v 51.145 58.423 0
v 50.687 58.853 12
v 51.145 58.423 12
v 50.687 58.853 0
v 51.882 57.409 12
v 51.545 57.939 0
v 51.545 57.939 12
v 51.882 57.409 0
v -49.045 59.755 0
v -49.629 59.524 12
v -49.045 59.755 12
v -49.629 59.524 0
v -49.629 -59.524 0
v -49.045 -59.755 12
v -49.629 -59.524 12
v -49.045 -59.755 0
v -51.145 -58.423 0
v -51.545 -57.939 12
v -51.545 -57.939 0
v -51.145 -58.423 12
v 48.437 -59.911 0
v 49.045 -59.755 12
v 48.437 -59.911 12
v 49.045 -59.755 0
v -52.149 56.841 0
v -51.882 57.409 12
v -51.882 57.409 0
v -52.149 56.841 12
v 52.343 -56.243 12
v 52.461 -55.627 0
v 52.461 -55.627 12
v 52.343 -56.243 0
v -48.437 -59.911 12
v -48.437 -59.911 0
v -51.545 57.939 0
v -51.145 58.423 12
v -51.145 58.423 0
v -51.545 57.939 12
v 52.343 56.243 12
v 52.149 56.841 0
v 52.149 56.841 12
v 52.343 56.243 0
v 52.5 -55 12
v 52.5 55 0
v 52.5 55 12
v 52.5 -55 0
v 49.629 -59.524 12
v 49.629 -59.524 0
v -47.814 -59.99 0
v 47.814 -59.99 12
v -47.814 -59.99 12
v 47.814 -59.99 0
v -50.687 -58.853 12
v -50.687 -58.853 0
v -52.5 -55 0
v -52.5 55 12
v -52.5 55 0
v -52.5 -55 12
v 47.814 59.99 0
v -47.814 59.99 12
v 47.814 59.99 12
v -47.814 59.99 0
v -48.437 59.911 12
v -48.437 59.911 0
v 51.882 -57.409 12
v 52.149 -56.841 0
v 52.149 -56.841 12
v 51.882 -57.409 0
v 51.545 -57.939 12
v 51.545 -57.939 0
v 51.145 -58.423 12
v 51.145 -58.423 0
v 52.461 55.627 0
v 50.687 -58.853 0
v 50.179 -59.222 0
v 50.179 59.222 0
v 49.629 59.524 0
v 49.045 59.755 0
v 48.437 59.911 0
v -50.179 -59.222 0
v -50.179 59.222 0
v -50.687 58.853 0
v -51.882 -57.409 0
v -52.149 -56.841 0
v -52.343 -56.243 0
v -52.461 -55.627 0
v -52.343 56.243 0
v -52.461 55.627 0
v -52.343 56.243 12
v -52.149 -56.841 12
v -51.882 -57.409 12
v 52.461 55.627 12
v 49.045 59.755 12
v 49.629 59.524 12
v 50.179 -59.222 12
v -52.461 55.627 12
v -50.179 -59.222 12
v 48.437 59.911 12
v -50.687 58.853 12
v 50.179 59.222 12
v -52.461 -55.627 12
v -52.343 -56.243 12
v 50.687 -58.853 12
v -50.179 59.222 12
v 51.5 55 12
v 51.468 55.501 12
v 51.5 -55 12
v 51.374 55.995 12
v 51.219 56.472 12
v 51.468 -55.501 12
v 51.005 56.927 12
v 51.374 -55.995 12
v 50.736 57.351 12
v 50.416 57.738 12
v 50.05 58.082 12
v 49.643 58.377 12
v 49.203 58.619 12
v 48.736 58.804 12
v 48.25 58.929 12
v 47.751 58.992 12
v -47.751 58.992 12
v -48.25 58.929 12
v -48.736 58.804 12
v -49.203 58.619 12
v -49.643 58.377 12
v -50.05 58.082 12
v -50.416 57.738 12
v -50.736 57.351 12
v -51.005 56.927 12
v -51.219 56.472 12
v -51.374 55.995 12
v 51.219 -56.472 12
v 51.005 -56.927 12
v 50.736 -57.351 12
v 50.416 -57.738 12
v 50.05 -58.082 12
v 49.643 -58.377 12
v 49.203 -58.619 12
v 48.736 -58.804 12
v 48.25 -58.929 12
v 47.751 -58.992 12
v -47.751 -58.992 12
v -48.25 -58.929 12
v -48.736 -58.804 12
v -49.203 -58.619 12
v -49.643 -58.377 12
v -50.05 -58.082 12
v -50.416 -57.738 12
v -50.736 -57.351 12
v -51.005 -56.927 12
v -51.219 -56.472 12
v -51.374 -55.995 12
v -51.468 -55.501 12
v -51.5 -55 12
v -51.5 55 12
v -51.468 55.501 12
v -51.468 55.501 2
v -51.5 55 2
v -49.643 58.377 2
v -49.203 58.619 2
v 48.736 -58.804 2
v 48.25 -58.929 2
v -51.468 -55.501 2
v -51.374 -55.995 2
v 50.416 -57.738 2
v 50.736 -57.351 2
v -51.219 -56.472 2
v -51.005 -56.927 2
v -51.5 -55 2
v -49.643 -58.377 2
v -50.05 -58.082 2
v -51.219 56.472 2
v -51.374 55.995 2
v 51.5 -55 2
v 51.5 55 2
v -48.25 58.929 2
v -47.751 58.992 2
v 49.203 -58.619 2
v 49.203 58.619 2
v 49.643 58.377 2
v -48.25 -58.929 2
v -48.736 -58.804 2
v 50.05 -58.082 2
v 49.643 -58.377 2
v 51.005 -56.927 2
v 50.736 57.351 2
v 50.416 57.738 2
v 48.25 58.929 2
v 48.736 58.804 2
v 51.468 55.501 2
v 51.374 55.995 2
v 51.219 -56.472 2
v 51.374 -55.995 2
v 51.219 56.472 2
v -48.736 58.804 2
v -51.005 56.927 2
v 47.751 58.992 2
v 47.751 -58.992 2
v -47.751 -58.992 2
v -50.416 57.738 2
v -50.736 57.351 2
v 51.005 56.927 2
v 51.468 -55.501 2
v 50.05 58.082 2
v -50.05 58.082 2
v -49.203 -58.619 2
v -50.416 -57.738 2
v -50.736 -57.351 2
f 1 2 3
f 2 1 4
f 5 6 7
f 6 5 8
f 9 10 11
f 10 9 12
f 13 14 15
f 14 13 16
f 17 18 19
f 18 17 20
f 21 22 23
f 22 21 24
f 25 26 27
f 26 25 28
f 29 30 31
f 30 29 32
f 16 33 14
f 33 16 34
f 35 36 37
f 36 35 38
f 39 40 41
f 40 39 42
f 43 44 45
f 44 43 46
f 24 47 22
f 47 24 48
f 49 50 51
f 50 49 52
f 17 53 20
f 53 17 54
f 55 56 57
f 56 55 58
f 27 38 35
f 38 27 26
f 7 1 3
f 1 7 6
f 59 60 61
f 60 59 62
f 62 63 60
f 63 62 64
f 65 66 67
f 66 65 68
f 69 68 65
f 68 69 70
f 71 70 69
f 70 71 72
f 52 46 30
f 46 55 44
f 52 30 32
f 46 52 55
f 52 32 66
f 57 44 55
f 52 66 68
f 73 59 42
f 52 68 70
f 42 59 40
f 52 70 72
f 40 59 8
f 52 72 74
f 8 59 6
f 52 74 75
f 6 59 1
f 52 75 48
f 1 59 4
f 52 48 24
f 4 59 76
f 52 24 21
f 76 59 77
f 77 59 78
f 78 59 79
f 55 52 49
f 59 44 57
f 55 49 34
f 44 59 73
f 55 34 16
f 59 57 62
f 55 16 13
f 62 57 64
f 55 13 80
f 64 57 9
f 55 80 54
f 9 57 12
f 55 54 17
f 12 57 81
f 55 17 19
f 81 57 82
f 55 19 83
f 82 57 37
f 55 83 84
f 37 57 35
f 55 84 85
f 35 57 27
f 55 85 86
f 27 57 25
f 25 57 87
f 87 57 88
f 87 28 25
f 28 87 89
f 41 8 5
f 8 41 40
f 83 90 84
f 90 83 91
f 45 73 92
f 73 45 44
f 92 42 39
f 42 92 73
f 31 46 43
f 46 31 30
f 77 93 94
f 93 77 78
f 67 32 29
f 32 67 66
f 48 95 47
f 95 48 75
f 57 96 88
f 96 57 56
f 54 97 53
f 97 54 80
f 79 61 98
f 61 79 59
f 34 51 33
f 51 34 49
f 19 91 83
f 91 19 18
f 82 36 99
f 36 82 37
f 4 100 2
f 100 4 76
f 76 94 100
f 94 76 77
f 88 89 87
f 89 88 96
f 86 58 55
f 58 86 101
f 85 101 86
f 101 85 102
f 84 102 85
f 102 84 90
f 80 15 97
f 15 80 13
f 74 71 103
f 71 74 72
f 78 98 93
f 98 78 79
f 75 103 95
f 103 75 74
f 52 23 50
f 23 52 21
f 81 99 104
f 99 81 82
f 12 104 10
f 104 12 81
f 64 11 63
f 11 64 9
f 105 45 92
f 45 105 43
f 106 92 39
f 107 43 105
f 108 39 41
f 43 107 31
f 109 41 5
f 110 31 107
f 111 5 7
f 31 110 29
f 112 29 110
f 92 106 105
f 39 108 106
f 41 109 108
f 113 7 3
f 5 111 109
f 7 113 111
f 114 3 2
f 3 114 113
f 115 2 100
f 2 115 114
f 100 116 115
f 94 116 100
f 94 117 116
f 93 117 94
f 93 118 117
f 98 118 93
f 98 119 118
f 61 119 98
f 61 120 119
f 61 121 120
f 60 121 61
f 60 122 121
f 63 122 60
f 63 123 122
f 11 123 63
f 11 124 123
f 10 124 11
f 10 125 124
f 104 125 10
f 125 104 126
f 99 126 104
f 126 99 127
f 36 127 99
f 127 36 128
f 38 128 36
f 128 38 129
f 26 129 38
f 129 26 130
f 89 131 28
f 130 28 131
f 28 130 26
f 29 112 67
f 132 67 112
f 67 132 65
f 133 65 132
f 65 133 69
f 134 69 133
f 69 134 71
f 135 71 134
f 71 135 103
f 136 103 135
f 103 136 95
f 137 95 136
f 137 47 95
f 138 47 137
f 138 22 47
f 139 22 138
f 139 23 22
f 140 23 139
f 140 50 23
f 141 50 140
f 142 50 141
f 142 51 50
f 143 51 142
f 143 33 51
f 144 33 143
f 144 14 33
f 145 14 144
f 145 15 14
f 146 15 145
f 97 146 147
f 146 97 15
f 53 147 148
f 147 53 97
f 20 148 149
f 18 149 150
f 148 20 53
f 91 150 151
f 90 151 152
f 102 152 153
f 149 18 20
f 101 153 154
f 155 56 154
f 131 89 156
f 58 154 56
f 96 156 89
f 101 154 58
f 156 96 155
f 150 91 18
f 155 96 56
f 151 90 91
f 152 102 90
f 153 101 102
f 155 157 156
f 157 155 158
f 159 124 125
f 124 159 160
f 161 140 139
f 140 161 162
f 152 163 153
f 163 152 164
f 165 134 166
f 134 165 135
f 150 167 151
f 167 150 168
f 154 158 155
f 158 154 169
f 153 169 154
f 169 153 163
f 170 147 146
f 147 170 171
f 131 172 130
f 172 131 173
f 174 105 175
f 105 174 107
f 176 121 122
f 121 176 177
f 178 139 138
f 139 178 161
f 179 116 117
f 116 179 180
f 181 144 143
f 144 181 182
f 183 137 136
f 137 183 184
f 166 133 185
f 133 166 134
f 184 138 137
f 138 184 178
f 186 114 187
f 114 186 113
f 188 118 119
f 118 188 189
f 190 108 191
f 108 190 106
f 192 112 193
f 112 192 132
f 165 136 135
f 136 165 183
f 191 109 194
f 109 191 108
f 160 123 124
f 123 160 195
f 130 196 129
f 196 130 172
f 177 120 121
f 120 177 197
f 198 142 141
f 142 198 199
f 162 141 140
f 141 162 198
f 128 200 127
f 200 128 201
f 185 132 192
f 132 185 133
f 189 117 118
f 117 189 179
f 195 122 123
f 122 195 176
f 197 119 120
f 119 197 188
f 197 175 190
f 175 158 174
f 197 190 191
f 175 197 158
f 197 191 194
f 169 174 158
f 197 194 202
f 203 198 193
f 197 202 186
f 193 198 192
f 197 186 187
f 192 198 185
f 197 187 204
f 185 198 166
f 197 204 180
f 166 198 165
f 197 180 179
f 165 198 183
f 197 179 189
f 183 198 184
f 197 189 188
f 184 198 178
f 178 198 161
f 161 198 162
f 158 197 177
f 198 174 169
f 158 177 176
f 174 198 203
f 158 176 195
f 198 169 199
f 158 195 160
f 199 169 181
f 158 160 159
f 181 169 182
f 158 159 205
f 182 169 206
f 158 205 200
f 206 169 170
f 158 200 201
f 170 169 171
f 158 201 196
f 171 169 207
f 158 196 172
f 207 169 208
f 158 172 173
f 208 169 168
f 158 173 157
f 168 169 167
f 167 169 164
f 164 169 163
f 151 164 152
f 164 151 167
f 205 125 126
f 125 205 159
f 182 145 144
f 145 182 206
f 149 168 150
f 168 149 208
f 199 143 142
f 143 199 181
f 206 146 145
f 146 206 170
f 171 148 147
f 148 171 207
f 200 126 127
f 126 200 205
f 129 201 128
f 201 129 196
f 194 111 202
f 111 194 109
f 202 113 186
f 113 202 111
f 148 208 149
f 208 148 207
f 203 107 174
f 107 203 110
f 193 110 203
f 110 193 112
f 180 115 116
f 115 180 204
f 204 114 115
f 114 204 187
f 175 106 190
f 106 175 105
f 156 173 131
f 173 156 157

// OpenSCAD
$fn = 50;


difference() {
	union() {
		hull() {
			translate(v = [-47.5000000000, 55.0000000000, 0]) {
				cylinder(h = 12, r = 5);
			}
			translate(v = [47.5000000000, 55.0000000000, 0]) {
				cylinder(h = 12, r = 5);
			}
			translate(v = [-47.5000000000, -55.0000000000, 0]) {
				cylinder(h = 12, r = 5);
			}
			translate(v = [47.5000000000, -55.0000000000, 0]) {
				cylinder(h = 12, r = 5);
			}
		}
	}
	union() {
		translate(v = [0, 0, 2]) {
			hull() {
				translate(v = [-47.5000000000, 55.0000000000, 0]) {
					cylinder(h = 10, r = 4);
				}
				translate(v = [47.5000000000, 55.0000000000, 0]) {
					cylinder(h = 10, r = 4);
				}
				translate(v = [-47.5000000000, -55.0000000000, 0]) {
					cylinder(h = 10, r = 4);
				}
				translate(v = [47.5000000000, -55.0000000000, 0]) {
					cylinder(h = 10, r = 4);
				}
			}
		}
	}
}
